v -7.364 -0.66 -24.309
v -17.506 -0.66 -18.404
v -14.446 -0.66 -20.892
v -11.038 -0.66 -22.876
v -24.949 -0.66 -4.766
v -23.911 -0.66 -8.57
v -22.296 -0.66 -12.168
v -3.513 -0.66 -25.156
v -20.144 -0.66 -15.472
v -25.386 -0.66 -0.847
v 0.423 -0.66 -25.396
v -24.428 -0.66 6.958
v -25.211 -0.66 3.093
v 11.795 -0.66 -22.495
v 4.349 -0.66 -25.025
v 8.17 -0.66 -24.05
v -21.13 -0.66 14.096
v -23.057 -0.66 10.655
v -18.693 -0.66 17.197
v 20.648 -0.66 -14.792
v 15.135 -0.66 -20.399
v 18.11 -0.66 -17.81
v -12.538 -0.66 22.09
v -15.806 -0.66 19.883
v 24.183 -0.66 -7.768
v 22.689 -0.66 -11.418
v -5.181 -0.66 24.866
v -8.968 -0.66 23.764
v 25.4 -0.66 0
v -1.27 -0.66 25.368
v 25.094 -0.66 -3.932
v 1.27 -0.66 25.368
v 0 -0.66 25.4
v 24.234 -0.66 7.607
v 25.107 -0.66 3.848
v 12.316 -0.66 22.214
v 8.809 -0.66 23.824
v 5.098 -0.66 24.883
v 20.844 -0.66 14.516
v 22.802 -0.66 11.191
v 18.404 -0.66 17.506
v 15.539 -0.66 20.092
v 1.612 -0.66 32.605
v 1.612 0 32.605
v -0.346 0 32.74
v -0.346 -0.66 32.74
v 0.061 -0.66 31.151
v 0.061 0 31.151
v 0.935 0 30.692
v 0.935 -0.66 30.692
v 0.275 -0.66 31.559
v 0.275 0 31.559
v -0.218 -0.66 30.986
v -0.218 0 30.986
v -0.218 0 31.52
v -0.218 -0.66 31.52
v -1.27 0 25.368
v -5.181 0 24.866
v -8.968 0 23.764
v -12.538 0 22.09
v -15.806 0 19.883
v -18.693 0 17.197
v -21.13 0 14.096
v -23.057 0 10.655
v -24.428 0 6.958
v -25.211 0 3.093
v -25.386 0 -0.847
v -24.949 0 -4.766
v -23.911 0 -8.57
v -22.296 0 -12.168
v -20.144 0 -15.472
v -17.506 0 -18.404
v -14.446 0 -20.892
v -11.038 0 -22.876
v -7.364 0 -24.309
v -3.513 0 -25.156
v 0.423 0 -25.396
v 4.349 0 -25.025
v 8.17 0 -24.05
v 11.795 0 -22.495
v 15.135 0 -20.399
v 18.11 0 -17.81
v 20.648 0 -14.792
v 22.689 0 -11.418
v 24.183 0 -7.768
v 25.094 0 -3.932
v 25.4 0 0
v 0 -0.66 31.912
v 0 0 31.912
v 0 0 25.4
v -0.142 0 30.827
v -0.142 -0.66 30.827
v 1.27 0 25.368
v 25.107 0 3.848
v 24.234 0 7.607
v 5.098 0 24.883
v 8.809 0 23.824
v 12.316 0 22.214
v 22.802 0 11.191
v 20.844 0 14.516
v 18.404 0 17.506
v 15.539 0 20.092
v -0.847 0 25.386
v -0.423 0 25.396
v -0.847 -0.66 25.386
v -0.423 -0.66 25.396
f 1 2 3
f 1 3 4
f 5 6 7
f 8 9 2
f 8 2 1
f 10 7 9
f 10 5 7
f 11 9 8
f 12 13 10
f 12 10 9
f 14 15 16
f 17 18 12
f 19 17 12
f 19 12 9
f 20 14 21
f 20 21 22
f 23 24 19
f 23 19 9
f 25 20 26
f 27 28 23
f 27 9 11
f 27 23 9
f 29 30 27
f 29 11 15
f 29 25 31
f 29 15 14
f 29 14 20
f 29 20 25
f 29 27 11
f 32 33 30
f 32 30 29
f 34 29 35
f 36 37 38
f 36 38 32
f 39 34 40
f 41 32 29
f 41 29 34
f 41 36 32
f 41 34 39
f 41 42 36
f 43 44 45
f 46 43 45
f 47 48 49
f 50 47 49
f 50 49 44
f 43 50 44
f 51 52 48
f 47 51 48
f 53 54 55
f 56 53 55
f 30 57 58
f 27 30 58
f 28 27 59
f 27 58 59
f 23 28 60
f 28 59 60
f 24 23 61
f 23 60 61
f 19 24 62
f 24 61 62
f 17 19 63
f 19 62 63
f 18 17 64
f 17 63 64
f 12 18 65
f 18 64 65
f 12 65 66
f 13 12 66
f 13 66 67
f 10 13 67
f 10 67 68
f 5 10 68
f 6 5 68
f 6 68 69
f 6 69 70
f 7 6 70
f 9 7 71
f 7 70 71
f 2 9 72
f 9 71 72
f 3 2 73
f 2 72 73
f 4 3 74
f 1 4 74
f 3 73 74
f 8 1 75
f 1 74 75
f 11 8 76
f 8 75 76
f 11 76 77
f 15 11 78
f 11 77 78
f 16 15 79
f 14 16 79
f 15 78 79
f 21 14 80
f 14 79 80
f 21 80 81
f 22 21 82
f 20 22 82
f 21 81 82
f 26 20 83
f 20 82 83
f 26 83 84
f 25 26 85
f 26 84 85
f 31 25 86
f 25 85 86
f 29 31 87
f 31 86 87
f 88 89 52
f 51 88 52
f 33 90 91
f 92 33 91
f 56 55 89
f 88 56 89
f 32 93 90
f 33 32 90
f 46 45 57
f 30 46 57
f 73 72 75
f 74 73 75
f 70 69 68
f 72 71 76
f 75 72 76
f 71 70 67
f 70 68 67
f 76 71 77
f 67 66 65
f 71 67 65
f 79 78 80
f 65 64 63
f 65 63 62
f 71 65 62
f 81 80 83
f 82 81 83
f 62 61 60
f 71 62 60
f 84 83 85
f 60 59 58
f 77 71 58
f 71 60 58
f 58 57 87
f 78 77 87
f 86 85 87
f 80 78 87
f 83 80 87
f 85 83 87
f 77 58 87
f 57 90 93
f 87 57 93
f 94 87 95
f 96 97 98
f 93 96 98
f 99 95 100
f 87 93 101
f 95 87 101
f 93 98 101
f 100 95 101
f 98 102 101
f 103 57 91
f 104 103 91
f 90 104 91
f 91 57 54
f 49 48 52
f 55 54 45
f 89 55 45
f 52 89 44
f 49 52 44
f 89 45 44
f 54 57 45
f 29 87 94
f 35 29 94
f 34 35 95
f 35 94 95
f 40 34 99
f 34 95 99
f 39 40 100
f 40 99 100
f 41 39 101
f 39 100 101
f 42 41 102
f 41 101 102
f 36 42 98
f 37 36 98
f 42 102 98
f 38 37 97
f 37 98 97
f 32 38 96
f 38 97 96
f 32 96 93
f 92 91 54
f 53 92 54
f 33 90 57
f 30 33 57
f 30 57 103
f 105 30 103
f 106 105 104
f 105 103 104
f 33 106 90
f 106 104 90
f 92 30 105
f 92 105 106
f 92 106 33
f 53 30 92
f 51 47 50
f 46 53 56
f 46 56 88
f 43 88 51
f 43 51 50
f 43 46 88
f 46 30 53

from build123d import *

# Parameters (mm, degrees)
F1_DEPTH = 0.6604


with BuildPart() as f1:
    # F0 (on Front) → F1 (new body)
    with BuildSketch(Plane.XZ):
        with BuildLine():
            Line((-0.345766, 32.740355), (-1.269603, 25.36825))
            ThreePointArc((-1.269603, 25.36825), (-0.635, 25.392061), (0, 25.4))
            Line((0, 25.4), (-0.142427, 30.827465))
            Line((-0.142427, 30.827465), (-0.217738, 30.985618))
            Line((-0.217738, 30.985618), (-0.217738, 31.520322))
            Line((-0.217738, 31.520322), (0, 31.911939))
            Line((0, 31.911939), (0.27527, 31.558935))
            Line((0.27527, 31.558935), (0.060911, 31.1513))
            Line((0.060911, 31.1513), (0.934515, 30.691907))
            Line((0.934515, 30.691907), (1.61231, 32.604795))
            Line((1.61231, 32.604795), (-0.345766, 32.740355))
        make_face()
        with BuildLine():
            ThreePointArc((-1.269603, 25.36825), (-17.505886, -18.403912), (25.4, 0))
            ThreePointArc((25.4, 0), (18.403912, 17.505886), (1.269603, 25.36825))
            Line((1.269603, 25.36825), (0, 25.4))
            Line((0, 25.4), (-1.269603, 25.36825))
        make_face()
    extrude(amount=F1_DEPTH)


solid = f1.part
